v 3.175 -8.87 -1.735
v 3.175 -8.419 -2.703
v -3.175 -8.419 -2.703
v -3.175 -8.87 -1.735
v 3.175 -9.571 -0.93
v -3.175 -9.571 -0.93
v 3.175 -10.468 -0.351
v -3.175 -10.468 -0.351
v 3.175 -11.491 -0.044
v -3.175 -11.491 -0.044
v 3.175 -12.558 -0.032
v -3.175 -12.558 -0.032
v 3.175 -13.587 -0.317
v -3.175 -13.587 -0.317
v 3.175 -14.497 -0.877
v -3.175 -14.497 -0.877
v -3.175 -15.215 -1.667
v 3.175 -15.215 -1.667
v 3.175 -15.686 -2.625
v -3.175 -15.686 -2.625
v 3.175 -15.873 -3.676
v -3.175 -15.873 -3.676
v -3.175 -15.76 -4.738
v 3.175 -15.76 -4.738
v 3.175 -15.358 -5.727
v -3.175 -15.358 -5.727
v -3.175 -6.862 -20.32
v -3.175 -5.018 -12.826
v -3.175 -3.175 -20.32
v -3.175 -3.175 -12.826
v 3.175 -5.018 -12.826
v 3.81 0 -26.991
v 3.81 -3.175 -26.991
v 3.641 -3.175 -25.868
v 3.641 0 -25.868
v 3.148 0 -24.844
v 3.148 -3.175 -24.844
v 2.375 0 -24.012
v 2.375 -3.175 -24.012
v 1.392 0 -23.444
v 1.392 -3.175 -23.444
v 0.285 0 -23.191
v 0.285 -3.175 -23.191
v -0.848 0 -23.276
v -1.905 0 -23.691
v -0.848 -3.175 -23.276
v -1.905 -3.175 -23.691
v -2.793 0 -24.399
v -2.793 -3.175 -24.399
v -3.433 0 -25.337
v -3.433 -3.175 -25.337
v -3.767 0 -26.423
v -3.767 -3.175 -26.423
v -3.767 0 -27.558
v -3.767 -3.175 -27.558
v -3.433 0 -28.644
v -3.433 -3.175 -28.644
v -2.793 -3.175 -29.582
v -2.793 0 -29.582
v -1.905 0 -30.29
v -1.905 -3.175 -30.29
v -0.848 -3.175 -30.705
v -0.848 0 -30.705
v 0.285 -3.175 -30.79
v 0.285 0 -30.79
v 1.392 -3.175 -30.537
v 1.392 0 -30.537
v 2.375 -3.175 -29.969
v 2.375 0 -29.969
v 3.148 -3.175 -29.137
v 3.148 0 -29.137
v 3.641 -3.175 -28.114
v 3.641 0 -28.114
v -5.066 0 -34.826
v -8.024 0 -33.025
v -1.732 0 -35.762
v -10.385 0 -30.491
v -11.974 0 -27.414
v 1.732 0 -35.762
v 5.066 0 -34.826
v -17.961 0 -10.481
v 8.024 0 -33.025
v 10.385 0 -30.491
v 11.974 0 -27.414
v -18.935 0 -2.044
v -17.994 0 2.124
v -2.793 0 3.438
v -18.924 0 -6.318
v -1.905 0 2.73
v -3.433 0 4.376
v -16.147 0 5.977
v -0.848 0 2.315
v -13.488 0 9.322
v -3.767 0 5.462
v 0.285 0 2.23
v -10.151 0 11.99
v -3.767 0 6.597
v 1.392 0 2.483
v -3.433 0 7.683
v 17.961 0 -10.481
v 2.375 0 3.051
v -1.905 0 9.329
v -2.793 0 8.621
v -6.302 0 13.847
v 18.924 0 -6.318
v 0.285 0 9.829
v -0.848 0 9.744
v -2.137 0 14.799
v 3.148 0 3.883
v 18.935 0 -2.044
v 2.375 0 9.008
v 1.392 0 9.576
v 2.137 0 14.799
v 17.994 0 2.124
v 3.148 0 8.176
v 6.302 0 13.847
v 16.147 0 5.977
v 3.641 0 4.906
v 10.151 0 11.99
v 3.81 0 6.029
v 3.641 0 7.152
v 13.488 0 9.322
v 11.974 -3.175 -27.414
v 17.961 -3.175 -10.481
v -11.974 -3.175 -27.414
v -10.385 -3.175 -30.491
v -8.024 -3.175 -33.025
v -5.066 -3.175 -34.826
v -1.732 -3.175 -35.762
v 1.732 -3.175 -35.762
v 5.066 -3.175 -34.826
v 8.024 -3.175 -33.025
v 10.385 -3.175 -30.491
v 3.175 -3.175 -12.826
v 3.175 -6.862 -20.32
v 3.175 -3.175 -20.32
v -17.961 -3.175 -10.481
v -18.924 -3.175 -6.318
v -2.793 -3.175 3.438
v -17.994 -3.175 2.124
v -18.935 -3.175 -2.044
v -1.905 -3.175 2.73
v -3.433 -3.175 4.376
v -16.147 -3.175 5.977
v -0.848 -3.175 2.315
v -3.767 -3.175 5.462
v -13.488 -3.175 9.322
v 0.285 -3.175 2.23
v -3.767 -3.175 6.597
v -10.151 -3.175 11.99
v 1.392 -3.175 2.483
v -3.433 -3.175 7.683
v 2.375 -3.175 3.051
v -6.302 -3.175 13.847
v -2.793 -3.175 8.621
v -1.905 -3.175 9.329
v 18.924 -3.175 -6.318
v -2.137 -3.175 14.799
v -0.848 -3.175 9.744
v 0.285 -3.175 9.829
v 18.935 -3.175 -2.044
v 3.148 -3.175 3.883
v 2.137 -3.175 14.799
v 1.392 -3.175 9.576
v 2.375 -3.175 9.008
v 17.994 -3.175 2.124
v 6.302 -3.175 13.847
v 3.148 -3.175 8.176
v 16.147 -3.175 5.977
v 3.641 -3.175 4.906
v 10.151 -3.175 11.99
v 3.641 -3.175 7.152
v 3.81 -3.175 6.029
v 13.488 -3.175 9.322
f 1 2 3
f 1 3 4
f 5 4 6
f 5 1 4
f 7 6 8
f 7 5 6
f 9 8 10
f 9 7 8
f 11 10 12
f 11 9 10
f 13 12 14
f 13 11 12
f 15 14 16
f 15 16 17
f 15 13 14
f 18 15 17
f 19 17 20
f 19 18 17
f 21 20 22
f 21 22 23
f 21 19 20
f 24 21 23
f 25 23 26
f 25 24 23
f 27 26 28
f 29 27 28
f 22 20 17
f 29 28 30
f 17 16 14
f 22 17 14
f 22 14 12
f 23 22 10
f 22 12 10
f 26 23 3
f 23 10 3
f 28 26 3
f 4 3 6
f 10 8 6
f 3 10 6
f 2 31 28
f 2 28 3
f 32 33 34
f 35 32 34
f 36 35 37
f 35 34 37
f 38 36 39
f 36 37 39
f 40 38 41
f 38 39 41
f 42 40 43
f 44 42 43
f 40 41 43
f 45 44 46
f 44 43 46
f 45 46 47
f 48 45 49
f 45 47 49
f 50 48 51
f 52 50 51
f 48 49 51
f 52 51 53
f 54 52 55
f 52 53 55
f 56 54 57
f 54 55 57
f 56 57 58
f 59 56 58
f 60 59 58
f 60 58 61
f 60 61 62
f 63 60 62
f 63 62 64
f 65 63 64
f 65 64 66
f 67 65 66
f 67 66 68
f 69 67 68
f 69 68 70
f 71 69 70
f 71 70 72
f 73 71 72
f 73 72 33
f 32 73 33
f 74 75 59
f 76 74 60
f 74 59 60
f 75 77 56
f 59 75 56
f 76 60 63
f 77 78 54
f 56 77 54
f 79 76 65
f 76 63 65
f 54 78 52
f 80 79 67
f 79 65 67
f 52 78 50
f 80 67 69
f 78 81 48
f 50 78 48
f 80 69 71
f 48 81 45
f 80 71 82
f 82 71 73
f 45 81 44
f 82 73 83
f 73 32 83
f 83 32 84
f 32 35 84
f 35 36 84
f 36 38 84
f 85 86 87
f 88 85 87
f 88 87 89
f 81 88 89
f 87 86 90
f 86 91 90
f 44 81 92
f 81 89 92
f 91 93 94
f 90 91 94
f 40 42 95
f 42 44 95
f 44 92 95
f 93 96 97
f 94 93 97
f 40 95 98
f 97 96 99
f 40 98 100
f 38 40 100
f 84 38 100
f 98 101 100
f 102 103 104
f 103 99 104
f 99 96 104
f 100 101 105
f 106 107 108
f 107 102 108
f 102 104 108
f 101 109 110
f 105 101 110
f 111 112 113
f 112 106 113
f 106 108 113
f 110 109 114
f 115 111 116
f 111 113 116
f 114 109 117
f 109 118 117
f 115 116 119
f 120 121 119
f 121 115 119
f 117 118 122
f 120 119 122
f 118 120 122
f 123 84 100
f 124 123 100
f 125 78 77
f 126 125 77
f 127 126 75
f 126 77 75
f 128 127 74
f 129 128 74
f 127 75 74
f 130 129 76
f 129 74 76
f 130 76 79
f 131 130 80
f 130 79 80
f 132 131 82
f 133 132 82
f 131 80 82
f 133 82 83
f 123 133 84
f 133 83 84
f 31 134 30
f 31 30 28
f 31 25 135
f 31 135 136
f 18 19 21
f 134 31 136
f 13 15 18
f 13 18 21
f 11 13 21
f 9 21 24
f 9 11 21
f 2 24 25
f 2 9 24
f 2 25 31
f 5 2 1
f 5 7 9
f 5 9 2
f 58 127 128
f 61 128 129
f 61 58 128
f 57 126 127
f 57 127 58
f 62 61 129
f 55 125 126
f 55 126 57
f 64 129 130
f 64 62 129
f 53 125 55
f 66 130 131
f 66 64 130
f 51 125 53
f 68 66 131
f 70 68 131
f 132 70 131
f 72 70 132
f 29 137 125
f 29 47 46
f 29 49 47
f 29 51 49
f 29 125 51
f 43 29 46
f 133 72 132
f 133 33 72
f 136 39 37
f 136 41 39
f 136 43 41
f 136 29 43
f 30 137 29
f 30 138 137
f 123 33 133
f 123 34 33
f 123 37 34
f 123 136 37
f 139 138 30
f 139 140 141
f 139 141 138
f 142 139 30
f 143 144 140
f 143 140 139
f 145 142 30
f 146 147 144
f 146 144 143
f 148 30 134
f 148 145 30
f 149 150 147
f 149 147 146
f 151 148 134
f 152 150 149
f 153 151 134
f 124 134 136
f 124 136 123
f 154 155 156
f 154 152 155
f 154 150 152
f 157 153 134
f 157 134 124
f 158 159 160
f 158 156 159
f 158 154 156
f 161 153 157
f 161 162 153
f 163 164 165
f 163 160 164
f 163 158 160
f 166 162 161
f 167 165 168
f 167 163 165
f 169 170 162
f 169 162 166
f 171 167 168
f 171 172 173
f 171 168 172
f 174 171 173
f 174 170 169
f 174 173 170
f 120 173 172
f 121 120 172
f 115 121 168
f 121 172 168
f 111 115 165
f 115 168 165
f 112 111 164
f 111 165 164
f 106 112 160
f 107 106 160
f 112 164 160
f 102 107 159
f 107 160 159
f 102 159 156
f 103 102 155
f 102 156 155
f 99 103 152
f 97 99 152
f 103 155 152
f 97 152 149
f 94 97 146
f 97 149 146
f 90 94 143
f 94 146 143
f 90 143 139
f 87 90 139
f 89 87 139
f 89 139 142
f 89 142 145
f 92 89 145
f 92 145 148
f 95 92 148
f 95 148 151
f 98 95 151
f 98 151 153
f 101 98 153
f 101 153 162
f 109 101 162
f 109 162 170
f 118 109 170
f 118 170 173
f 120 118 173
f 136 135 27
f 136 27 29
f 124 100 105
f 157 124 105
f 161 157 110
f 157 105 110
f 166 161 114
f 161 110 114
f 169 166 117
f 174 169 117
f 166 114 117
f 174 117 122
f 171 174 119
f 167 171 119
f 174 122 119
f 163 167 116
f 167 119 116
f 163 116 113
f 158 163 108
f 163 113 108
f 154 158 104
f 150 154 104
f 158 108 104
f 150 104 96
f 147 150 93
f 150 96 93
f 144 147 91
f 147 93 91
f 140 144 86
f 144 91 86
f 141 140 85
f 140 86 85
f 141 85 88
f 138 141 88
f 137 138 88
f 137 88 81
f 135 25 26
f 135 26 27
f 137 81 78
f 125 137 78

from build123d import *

# Parameters (mm, degrees)
F1_DEPTH = 3.175
F2_R     = 3.81
F3_DEPTH = 25.4
F6_DEPTH = 6.35


with BuildPart() as f1:
    # F0 (on Front) → F1 (new body)
    with BuildSketch(Plane.XZ):
        with BuildLine():
            Line((-17.960512, -10.480528), (-11.973675, -27.413861))
            ThreePointArc((-11.973675, -27.413861), (0, -35.880528), (11.973675, -27.413861))
            Line((11.973675, -27.413861), (17.960512, -10.480528))
            ThreePointArc((17.960512, -10.480528), (0, 14.919472), (-17.960512, -10.480528))
        make_face()
    extrude(amount=F1_DEPTH)

    # F2 (on face) → F3 (cut)
    with BuildSketch(Plane.XZ.offset(3.175)):
        with Locations((0, 6.029472)):
            Circle(F2_R)
        with Locations((0, -26.990528)):
            Circle(F2_R)
    extrude(amount=-F3_DEPTH, mode=Mode.SUBTRACT)

    # F5 (on offset) → F6 (join)
    with BuildSketch(Plane.YZ.offset(3.175)):
        with BuildLine():
            Line((-15.357632, -5.726944), (-6.861671, -20.32))
            Line((-6.861671, -20.32), (-3.175, -20.32))
            Line((-3.175, -20.32), (-3.175, -12.826101))
            Line((-3.175, -12.826101), (-5.018335, -12.826101))
            Line((-5.018335, -12.826101), (-8.419373, -2.702977))
            ThreePointArc((-8.419373, -2.702977), (-13.58725, -0.317314), (-15.357632, -5.726944))
        make_face()
    extrude(amount=-F6_DEPTH)


solid = f1.part
